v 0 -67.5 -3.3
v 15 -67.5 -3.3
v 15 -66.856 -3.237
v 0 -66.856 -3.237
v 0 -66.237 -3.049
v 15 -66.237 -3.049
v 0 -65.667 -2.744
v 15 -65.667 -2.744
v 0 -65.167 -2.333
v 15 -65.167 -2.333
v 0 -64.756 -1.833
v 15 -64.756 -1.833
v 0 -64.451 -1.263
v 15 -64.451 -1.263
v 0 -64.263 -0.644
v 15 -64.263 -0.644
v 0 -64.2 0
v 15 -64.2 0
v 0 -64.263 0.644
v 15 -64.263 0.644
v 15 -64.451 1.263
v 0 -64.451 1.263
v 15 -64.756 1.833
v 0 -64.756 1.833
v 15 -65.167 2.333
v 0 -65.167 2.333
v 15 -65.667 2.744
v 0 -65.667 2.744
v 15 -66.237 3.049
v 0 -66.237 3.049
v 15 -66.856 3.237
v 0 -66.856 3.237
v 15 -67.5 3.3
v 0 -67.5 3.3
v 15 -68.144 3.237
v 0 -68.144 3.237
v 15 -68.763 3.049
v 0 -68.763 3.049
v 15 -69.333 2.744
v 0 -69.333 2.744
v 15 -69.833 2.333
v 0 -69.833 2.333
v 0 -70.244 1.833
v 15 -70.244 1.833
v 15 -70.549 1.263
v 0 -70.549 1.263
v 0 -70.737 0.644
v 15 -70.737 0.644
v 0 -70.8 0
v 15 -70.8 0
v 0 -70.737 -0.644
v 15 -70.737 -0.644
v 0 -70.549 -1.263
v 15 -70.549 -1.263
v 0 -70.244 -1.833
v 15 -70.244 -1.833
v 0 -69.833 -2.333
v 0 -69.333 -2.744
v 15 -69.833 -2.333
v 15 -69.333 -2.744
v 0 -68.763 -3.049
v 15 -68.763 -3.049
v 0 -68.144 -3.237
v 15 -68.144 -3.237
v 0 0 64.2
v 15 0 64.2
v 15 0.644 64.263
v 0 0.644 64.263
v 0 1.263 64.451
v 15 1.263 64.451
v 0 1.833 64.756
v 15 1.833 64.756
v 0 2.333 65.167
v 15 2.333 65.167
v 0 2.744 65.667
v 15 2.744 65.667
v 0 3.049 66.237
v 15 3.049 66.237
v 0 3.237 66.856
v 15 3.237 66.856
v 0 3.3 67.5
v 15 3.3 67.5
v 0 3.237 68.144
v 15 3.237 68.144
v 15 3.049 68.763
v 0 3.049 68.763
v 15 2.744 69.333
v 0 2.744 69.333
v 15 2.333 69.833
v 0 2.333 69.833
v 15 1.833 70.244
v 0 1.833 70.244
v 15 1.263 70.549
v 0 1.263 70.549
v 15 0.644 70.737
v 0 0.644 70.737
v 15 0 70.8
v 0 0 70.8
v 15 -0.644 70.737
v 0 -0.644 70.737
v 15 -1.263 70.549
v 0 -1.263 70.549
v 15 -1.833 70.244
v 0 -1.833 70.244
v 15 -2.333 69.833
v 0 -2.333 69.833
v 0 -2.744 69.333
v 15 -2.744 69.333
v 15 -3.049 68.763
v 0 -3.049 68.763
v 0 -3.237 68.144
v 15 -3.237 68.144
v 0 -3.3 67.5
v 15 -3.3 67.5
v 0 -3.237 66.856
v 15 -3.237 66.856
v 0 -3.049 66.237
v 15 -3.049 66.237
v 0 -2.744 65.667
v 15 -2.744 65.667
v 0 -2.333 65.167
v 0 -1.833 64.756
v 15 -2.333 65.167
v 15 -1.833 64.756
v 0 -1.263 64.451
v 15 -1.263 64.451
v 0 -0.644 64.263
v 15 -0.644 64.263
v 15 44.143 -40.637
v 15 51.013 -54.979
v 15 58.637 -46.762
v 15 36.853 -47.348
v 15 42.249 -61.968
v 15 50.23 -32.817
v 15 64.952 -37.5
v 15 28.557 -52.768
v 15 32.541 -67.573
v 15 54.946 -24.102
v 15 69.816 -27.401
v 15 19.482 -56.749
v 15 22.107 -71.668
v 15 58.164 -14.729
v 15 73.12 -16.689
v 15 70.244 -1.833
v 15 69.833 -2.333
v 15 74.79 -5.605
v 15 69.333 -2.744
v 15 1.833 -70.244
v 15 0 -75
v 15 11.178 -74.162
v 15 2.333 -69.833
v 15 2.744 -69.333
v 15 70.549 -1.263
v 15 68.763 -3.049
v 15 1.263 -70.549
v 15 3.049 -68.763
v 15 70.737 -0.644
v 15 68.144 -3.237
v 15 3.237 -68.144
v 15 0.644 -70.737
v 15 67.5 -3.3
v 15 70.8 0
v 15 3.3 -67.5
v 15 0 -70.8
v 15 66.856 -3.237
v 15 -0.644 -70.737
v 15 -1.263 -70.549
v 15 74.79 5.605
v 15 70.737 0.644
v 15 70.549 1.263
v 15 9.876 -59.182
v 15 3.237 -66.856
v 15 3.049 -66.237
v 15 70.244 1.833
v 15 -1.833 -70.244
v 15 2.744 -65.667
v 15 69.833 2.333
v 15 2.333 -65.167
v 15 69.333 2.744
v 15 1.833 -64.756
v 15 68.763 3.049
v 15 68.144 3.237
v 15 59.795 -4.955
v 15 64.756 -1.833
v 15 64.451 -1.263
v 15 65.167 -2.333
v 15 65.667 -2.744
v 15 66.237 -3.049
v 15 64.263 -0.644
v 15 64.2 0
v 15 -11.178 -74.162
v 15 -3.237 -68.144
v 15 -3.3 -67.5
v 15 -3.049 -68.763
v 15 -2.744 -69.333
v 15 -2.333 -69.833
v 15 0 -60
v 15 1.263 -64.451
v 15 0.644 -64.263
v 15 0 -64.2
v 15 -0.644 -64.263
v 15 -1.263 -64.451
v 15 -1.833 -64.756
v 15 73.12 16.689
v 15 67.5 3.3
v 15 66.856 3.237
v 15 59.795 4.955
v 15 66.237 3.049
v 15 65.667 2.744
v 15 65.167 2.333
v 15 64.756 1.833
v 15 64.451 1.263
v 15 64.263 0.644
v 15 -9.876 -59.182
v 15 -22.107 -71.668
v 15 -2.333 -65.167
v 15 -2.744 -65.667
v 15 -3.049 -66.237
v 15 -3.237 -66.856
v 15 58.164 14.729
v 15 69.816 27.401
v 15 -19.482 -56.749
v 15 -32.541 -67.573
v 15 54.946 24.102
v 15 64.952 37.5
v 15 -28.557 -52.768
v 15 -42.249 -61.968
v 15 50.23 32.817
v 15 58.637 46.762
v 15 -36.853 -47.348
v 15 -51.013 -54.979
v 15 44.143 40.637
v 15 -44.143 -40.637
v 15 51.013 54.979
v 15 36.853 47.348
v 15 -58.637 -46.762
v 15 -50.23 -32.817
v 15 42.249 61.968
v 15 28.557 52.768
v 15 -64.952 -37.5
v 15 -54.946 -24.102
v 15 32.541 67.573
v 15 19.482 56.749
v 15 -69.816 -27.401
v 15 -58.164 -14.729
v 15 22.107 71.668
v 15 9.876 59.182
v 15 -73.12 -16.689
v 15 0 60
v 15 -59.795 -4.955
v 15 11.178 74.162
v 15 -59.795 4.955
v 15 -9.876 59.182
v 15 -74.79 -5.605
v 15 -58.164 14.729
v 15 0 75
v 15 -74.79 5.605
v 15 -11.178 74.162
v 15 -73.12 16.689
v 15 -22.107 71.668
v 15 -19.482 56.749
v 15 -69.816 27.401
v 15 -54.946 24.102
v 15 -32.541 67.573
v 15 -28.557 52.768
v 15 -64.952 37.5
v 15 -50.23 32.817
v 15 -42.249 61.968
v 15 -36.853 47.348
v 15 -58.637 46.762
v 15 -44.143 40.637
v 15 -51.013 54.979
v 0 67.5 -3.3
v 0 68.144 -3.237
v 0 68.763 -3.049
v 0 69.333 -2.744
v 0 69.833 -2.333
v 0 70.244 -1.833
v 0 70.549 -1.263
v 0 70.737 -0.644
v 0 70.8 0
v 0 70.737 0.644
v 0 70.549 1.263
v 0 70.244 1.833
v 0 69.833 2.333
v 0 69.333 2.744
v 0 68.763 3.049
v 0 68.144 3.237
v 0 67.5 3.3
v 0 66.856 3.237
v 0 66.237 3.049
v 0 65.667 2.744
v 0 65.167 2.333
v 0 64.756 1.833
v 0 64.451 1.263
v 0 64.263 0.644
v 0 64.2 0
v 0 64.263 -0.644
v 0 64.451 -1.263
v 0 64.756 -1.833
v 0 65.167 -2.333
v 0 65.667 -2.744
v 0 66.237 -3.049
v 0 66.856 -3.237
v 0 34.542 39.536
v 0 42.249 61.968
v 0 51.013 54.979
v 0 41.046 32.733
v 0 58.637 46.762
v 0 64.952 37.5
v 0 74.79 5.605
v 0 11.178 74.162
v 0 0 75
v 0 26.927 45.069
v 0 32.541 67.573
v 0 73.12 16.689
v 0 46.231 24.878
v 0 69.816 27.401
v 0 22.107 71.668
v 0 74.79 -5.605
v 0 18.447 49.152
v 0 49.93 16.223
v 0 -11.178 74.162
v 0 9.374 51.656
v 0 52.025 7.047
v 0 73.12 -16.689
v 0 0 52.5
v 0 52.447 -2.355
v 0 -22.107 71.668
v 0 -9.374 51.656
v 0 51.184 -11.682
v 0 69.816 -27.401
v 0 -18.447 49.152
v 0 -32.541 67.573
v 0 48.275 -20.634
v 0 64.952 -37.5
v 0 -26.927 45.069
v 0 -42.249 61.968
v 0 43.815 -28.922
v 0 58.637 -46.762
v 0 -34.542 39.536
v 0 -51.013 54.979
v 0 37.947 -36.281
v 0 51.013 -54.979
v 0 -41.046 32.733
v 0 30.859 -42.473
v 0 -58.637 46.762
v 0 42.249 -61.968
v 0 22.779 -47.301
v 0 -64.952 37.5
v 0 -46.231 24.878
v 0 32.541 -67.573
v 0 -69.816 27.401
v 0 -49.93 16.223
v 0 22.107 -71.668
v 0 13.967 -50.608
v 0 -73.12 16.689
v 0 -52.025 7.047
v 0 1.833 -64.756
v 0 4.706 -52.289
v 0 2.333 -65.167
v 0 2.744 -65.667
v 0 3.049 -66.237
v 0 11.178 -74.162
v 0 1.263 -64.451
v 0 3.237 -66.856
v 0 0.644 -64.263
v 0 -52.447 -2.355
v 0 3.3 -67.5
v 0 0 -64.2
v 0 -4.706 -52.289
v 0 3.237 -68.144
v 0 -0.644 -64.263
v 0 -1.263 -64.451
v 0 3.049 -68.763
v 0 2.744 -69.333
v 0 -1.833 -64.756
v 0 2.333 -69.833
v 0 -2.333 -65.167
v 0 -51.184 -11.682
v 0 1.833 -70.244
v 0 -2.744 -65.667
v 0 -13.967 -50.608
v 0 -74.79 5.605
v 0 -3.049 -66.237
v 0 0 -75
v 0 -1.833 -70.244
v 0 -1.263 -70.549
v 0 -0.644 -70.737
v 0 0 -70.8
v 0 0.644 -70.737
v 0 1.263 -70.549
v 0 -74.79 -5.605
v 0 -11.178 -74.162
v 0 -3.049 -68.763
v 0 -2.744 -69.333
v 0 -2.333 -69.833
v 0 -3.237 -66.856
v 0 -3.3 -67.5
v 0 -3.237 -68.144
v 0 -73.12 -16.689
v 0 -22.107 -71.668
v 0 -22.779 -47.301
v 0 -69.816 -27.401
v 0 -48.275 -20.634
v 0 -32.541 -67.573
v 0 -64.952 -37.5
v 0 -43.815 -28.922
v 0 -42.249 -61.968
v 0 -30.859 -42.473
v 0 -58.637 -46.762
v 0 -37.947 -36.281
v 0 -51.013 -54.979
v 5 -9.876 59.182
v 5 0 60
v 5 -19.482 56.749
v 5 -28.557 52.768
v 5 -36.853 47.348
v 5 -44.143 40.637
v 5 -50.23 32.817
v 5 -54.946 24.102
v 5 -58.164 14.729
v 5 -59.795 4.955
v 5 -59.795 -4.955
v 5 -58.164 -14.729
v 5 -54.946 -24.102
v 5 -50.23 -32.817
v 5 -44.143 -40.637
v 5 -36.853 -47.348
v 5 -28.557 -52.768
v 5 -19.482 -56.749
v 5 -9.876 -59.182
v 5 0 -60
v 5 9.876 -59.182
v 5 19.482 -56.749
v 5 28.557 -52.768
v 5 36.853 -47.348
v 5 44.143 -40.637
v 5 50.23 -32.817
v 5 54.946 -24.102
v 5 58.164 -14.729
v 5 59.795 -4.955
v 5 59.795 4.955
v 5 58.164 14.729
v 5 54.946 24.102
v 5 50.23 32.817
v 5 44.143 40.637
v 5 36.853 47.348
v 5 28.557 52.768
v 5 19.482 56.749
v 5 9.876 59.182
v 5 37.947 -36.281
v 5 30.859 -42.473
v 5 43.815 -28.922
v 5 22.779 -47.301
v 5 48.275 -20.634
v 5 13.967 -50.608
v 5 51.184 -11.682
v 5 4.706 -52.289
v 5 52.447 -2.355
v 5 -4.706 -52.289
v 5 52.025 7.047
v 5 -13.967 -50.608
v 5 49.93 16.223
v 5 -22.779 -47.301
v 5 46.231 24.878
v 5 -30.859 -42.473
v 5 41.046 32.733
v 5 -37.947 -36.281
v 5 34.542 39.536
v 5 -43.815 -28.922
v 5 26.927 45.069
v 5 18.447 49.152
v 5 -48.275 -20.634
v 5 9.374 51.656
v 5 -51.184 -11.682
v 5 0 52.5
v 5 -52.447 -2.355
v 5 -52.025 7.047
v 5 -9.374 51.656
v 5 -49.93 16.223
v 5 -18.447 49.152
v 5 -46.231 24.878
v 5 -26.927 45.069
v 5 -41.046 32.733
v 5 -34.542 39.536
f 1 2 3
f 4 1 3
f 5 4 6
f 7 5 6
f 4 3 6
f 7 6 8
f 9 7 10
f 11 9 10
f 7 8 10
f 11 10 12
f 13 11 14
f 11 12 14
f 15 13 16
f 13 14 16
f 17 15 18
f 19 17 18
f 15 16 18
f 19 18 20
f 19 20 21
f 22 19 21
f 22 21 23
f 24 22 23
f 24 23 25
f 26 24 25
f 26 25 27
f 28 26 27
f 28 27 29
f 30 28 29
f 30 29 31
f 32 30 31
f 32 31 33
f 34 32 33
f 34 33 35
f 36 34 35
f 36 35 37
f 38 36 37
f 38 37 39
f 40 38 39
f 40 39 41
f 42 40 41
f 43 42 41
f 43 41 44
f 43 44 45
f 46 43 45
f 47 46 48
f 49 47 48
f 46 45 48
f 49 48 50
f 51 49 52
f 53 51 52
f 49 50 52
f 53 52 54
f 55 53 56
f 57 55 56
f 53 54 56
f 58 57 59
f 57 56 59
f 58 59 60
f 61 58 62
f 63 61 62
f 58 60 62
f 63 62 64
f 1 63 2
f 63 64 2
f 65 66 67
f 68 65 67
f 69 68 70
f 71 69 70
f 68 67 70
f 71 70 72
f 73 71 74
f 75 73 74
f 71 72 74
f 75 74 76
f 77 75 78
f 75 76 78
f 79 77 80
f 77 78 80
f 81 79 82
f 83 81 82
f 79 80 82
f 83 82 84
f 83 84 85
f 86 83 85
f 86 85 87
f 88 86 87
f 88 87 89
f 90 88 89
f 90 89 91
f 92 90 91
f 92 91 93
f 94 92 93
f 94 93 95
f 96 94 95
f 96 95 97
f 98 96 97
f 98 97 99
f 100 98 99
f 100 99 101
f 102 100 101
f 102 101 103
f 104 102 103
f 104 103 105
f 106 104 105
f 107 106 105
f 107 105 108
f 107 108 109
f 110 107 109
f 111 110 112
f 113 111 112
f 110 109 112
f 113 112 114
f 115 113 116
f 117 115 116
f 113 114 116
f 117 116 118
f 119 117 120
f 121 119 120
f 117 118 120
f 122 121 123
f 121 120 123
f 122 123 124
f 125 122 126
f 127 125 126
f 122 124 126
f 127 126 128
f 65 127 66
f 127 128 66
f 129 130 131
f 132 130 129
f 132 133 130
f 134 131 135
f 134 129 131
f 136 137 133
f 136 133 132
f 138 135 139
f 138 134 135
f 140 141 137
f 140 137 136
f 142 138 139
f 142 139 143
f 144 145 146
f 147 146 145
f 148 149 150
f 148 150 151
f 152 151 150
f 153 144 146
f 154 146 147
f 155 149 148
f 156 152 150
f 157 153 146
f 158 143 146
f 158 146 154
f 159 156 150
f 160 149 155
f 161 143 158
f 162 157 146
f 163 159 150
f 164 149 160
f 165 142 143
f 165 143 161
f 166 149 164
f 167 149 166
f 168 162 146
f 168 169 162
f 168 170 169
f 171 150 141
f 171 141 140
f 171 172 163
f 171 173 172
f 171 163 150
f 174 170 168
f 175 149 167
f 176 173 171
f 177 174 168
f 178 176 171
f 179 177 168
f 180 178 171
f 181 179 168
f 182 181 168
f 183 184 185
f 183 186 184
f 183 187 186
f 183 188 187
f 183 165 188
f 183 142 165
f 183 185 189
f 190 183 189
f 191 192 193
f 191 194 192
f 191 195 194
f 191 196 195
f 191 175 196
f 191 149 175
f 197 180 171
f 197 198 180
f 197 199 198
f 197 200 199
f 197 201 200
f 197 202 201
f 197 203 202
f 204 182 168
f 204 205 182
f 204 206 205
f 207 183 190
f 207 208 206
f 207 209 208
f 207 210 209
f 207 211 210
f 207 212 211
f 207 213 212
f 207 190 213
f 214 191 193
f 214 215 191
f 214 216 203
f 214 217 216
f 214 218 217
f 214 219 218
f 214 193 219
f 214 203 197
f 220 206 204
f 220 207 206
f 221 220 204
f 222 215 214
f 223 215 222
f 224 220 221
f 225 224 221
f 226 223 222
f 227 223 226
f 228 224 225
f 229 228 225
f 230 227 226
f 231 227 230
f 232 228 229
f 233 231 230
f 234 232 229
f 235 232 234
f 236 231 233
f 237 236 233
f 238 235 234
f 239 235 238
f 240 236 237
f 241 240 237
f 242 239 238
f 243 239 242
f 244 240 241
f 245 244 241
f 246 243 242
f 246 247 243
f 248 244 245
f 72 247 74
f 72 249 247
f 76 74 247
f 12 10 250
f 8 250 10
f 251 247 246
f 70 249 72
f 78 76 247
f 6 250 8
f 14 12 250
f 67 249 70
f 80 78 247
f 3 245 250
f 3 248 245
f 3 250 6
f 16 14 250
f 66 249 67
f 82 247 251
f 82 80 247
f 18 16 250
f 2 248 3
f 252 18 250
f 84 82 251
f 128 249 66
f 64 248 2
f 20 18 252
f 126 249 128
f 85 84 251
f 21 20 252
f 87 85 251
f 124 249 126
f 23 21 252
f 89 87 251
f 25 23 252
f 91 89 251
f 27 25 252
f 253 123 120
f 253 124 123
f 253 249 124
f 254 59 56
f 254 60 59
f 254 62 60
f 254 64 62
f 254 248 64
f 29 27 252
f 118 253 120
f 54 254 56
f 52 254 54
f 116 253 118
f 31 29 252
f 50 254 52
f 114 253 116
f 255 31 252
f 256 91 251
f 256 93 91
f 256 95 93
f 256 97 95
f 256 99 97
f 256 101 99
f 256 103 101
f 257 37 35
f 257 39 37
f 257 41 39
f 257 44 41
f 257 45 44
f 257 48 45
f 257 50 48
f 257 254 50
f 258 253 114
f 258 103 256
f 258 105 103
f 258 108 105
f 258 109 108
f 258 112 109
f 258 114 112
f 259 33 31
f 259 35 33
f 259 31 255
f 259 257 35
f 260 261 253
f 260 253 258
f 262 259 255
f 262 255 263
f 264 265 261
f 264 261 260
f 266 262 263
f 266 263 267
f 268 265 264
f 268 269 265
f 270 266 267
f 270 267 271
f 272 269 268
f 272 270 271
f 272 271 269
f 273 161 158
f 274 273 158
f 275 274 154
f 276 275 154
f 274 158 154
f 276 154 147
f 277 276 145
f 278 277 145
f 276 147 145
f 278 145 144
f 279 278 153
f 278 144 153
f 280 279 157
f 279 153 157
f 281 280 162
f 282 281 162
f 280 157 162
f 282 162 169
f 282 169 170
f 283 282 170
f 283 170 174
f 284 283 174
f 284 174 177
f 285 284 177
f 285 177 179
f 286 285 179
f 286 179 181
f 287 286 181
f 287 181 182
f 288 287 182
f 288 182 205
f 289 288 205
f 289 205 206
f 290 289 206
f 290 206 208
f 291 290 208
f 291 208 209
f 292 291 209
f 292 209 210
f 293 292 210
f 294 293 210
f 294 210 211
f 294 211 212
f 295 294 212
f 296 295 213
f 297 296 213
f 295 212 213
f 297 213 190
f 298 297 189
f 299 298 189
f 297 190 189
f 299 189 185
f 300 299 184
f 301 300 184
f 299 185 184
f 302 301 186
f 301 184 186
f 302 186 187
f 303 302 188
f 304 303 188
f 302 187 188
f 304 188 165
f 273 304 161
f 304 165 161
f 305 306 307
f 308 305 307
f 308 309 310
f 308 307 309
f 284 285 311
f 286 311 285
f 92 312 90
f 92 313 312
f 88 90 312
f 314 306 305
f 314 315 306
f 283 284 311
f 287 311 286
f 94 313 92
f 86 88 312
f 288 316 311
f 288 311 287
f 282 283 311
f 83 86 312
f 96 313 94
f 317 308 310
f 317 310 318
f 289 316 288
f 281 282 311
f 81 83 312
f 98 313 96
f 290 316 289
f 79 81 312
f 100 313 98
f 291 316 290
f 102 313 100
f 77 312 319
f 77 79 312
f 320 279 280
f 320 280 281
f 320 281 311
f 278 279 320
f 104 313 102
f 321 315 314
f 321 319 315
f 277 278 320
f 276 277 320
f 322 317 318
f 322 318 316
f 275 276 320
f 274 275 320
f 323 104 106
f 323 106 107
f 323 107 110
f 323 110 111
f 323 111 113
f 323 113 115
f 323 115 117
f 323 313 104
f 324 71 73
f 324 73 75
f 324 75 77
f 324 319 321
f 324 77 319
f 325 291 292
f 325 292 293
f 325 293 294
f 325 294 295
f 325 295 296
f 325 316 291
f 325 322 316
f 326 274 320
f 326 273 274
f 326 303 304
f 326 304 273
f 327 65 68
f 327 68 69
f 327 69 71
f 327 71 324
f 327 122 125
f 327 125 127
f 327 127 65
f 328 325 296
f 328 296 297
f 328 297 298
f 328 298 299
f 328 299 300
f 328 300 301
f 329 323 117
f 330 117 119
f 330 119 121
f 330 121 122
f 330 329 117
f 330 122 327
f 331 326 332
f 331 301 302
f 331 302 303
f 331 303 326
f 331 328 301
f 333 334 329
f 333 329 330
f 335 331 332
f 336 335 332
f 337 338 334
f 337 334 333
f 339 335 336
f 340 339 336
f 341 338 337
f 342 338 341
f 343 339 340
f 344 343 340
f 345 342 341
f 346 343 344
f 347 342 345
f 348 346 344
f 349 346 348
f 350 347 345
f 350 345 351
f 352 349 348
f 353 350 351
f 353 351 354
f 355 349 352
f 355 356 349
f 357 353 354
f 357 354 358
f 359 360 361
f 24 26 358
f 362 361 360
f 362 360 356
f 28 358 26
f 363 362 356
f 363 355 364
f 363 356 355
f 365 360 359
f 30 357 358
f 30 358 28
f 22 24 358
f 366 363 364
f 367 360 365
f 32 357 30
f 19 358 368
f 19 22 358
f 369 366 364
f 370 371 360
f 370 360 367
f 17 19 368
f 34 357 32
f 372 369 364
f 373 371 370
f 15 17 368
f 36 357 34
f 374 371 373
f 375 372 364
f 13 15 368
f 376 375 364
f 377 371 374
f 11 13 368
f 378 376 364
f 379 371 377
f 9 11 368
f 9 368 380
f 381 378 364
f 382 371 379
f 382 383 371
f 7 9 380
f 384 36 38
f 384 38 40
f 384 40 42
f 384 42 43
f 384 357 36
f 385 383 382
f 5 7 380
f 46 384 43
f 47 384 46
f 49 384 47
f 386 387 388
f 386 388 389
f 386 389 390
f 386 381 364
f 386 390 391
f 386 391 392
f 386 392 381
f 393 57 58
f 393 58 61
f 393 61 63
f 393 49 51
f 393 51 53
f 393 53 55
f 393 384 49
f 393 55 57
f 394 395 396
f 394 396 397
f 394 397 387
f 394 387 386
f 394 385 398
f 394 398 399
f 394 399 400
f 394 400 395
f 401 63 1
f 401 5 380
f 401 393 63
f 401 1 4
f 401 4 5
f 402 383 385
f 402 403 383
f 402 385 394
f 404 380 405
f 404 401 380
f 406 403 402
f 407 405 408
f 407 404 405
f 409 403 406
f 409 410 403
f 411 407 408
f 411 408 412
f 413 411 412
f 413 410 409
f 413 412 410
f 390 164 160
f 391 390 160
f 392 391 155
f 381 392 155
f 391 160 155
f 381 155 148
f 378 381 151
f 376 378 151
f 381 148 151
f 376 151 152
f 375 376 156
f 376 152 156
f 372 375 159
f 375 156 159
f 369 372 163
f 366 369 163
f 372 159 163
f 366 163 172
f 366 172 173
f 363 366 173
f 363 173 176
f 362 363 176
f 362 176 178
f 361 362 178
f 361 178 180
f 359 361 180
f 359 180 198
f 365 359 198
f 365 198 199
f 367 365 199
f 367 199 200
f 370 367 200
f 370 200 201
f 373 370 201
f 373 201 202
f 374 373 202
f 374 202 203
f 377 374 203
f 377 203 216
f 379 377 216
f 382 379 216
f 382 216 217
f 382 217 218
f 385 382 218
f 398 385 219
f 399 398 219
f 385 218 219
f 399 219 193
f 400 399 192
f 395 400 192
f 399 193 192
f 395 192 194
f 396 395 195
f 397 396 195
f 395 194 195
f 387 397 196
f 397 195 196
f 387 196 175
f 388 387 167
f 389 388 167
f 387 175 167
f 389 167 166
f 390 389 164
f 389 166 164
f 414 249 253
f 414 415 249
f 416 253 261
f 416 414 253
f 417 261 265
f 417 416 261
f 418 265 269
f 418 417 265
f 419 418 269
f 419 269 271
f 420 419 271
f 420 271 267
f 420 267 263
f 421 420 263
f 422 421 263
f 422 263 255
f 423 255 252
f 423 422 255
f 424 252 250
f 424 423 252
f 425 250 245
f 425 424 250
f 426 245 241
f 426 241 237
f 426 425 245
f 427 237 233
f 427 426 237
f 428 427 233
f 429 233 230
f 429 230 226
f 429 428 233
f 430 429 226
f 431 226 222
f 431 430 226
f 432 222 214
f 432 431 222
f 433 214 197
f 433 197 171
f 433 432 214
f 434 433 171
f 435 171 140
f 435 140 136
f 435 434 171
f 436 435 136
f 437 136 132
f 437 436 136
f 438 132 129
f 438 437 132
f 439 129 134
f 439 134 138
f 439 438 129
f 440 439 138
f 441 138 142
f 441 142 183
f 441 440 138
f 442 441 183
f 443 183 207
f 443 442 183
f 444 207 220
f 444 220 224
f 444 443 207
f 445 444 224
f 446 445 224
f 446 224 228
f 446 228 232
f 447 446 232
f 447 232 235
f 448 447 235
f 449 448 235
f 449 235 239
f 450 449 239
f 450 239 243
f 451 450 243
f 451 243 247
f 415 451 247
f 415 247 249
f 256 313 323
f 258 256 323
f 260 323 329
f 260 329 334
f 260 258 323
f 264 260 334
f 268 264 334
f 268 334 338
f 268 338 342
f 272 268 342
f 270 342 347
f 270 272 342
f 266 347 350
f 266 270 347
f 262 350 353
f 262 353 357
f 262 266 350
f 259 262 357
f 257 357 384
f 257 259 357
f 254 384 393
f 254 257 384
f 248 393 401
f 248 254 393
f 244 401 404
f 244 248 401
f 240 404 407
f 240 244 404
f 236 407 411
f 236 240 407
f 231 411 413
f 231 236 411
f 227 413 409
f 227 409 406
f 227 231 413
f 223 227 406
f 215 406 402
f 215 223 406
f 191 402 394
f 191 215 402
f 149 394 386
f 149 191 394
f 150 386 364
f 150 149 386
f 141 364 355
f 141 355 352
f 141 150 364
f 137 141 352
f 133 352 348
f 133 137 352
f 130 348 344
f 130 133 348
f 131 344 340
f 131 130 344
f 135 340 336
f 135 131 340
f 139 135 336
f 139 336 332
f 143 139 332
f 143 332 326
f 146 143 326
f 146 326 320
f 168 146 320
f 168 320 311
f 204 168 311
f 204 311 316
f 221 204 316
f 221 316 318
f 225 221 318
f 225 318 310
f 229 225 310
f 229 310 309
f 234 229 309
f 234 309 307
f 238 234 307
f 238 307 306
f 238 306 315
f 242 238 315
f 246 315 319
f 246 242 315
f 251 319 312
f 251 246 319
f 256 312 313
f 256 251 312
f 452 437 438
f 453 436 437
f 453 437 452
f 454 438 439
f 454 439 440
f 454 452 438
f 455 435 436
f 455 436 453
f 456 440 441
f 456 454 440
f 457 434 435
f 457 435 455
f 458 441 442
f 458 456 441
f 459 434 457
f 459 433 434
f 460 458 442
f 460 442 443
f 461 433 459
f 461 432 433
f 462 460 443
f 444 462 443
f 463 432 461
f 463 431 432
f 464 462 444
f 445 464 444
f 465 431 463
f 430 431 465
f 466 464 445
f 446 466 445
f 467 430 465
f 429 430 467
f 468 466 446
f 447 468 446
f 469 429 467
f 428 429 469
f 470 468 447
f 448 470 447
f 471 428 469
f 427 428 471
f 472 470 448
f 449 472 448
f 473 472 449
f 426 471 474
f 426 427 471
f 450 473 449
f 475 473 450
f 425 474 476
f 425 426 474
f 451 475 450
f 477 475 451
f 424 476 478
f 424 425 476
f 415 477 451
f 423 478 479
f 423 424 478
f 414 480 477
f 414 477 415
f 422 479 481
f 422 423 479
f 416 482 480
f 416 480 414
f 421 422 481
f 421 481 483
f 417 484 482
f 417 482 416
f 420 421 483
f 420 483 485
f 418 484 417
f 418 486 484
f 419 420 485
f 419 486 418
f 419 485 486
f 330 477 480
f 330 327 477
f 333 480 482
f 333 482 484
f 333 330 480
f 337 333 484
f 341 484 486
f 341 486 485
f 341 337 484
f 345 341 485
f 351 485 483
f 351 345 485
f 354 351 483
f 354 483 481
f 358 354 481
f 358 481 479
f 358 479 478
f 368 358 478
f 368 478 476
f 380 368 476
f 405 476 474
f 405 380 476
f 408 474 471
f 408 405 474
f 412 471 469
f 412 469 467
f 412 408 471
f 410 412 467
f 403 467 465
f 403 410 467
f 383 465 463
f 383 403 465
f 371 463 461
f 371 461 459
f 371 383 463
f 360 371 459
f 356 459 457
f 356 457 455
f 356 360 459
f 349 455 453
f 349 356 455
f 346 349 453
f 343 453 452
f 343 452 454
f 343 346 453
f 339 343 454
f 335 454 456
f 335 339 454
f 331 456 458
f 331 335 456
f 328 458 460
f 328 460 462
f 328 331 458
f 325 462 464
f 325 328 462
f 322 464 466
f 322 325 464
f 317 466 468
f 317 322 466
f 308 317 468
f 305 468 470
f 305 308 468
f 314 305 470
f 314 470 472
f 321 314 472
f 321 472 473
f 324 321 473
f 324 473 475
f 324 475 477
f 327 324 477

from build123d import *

# Parameters (mm, degrees)
PER_AGE1_D = 6.6


with BuildPart() as part:
    # Esquisse1 → Base-Révolution (revolve)
    with BuildSketch(Plane.XY, mode=Mode.PRIVATE) as base_r_volution_sk:
        Polygon((0, 52.5), (0, 75), (15, 75), (15, 60), (5, 60), (5, 52.5), align=None)
    revolve(base_r_volution_sk.sketch.rotate(Axis((-16.708877928, 0, 0), (1, 0, 0)), 90), axis=Axis((-16.708877928, 0, 0), (1, 0, 0)))

    # Perçage1 (through all)
    with Locations(Plane.ZY):
        with Locations((0, 67.5), (67.5, 0), (0, -67.5), (-67.5, 0)):
            Hole(PER_AGE1_D / 2)


solid = part.part
